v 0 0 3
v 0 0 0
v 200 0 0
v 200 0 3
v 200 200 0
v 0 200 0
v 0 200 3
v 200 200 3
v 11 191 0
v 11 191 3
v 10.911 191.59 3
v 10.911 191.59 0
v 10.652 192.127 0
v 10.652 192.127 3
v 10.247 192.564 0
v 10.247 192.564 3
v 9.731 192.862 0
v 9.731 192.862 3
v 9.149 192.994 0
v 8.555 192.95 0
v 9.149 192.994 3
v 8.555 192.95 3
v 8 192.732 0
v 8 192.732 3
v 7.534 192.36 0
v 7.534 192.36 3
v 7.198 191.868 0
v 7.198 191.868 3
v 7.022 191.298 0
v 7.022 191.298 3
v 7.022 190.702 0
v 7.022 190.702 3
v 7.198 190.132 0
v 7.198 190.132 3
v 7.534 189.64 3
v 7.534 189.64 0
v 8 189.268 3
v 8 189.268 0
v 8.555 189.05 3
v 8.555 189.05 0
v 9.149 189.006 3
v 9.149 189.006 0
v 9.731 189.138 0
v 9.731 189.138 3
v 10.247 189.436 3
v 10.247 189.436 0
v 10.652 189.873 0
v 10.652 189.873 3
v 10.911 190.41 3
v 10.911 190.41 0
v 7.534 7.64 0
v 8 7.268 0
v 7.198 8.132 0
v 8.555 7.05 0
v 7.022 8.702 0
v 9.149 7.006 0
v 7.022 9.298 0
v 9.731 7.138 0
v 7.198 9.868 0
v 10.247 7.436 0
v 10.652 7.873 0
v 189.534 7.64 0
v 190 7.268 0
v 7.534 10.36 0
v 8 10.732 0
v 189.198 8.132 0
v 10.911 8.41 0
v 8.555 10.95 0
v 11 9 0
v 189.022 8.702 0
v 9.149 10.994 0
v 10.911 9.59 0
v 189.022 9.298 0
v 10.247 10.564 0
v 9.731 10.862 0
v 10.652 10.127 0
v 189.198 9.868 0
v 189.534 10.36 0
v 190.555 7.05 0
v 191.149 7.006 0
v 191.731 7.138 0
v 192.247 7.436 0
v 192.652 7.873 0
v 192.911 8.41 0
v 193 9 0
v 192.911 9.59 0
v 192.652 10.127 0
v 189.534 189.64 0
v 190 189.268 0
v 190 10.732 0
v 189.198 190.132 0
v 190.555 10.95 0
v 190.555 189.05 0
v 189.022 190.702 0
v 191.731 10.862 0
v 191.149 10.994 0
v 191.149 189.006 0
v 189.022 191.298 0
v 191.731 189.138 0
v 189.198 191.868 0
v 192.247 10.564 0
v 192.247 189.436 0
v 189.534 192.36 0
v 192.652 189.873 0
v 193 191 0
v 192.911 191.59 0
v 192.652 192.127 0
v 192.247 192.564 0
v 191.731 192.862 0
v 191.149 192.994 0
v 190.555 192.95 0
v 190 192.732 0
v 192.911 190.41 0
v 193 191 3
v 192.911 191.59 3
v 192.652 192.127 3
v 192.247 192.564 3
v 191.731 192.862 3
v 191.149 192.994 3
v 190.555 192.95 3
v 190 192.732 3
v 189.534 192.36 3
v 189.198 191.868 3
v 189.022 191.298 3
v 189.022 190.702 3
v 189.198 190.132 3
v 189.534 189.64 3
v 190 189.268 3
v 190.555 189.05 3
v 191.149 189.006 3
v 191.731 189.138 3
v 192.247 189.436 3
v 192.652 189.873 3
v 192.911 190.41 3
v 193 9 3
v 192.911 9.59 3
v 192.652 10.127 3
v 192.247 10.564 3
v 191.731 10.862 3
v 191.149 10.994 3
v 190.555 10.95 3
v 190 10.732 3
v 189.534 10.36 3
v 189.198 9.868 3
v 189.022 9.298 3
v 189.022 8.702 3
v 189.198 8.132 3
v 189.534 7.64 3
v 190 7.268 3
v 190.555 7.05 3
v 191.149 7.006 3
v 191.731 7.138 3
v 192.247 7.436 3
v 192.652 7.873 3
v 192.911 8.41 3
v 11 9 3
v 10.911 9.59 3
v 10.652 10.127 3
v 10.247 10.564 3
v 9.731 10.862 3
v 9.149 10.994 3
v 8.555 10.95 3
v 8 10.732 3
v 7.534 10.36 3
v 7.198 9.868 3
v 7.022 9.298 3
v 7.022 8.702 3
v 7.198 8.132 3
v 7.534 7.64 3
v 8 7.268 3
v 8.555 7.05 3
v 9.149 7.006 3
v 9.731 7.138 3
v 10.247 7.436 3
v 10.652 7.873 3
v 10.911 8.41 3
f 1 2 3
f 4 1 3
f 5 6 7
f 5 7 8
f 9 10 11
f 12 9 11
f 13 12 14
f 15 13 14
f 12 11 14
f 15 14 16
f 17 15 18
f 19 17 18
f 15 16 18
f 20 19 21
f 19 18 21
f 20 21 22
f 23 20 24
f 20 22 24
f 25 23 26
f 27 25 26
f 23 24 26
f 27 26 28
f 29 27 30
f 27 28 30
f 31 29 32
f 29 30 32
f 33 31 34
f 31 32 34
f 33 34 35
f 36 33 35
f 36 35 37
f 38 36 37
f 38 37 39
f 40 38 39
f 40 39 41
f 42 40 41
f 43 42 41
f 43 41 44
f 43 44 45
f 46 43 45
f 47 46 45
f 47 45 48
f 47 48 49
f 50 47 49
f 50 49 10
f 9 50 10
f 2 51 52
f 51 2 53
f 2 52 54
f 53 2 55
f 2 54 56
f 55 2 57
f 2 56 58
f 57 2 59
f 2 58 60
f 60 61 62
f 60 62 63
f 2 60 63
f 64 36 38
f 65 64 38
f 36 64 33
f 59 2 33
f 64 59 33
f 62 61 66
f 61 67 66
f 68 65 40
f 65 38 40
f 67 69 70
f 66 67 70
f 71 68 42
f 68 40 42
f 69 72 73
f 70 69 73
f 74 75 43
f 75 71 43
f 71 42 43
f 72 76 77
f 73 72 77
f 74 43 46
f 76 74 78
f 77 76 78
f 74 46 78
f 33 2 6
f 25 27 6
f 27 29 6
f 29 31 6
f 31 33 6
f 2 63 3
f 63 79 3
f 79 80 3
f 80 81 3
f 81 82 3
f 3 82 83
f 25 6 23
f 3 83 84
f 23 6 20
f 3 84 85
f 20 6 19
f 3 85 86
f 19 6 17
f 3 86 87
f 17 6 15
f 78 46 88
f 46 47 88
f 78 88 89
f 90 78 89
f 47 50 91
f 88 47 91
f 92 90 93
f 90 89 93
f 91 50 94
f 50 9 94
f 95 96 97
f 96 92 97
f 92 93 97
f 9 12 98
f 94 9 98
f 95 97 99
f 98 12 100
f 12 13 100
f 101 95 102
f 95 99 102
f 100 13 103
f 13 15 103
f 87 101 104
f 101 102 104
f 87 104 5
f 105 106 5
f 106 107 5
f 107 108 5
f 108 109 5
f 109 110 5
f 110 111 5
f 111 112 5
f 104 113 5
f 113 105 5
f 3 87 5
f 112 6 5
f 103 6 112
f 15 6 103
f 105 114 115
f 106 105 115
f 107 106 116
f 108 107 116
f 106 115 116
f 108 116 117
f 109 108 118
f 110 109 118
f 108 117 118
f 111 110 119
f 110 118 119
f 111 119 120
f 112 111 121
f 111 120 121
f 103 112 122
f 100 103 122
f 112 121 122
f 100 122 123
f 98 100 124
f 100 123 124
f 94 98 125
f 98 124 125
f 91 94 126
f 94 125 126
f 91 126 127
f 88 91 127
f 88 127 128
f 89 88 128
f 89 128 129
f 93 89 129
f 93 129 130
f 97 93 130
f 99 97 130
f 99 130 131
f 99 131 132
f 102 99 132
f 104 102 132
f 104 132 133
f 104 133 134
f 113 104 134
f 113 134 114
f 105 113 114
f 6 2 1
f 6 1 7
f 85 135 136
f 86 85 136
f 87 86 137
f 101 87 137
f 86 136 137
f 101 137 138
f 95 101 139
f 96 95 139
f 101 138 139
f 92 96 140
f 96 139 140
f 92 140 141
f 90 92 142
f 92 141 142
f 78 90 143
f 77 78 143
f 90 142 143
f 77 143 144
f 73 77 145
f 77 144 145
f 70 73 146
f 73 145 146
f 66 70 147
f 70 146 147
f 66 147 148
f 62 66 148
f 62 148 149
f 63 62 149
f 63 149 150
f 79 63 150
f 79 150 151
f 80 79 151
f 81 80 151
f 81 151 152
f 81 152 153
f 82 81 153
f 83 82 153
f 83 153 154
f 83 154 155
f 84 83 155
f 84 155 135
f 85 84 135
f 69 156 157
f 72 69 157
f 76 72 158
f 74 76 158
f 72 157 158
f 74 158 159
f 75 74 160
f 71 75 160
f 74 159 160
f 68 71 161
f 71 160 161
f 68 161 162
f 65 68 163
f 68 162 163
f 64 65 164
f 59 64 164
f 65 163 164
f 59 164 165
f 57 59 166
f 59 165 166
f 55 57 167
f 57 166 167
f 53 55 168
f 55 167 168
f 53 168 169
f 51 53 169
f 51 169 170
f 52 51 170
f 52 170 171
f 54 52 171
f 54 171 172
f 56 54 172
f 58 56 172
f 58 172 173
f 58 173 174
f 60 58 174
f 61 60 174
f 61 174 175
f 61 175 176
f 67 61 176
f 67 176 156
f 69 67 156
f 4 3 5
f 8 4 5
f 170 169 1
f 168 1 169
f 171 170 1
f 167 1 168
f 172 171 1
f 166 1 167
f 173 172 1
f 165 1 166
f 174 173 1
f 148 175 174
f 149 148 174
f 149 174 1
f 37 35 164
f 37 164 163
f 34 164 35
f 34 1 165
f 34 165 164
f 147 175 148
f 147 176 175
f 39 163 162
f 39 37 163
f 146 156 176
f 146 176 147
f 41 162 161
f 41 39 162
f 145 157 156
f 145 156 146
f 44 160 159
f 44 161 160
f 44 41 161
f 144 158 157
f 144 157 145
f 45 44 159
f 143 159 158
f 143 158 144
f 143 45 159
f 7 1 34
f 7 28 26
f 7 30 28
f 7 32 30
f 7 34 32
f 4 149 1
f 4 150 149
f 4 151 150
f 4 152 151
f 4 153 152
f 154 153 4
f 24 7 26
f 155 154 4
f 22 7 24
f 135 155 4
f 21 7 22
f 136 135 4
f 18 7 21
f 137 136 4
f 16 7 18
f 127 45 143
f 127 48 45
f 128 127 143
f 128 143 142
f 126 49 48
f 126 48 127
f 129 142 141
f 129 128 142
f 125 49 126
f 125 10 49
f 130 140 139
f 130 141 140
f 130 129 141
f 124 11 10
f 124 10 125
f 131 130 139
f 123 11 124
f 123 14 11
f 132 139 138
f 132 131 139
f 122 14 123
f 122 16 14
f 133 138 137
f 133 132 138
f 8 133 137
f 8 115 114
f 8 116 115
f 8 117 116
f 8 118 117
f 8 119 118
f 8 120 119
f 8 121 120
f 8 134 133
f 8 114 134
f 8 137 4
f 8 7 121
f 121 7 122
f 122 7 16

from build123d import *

# Parameters (mm, degrees)
ESQUISSE1_W                  = 200
ESQUISSE1_H                  = 200
BOSS_EXTRU_1_DEPTH           = 3
ESQUISSE2_R                  = 2
ENL_V_MAT_EXTRU_1_DEPTH      = 1
ENL_V_MAT_EXTRU_1_DEPTH_BACK = 4


with BuildPart() as part:
    # Esquisse1 → Boss.-Extru.1 (new body)
    with BuildSketch(Plane.XY):
        with Locations((100, 100)):
            Rectangle(ESQUISSE1_W, ESQUISSE1_H)
    extrude(amount=BOSS_EXTRU_1_DEPTH)

    # Esquisse2 → Enlèv. mat.-Extru.1 (cut, two sides)
    with BuildSketch(Plane.XY.offset(3)) as enl_v_mat_extru_1_sk:
        with Locations((9, 191)):
            Circle(ESQUISSE2_R)
        with Locations((191, 191)):
            Circle(ESQUISSE2_R)
        with Locations((191, 9)):
            Circle(ESQUISSE2_R)
        with Locations((9, 9)):
            Circle(ESQUISSE2_R)
    extrude(amount=ENL_V_MAT_EXTRU_1_DEPTH, mode=Mode.SUBTRACT)
    extrude(enl_v_mat_extru_1_sk.sketch, amount=-ENL_V_MAT_EXTRU_1_DEPTH_BACK, mode=Mode.SUBTRACT)


solid = part.part
